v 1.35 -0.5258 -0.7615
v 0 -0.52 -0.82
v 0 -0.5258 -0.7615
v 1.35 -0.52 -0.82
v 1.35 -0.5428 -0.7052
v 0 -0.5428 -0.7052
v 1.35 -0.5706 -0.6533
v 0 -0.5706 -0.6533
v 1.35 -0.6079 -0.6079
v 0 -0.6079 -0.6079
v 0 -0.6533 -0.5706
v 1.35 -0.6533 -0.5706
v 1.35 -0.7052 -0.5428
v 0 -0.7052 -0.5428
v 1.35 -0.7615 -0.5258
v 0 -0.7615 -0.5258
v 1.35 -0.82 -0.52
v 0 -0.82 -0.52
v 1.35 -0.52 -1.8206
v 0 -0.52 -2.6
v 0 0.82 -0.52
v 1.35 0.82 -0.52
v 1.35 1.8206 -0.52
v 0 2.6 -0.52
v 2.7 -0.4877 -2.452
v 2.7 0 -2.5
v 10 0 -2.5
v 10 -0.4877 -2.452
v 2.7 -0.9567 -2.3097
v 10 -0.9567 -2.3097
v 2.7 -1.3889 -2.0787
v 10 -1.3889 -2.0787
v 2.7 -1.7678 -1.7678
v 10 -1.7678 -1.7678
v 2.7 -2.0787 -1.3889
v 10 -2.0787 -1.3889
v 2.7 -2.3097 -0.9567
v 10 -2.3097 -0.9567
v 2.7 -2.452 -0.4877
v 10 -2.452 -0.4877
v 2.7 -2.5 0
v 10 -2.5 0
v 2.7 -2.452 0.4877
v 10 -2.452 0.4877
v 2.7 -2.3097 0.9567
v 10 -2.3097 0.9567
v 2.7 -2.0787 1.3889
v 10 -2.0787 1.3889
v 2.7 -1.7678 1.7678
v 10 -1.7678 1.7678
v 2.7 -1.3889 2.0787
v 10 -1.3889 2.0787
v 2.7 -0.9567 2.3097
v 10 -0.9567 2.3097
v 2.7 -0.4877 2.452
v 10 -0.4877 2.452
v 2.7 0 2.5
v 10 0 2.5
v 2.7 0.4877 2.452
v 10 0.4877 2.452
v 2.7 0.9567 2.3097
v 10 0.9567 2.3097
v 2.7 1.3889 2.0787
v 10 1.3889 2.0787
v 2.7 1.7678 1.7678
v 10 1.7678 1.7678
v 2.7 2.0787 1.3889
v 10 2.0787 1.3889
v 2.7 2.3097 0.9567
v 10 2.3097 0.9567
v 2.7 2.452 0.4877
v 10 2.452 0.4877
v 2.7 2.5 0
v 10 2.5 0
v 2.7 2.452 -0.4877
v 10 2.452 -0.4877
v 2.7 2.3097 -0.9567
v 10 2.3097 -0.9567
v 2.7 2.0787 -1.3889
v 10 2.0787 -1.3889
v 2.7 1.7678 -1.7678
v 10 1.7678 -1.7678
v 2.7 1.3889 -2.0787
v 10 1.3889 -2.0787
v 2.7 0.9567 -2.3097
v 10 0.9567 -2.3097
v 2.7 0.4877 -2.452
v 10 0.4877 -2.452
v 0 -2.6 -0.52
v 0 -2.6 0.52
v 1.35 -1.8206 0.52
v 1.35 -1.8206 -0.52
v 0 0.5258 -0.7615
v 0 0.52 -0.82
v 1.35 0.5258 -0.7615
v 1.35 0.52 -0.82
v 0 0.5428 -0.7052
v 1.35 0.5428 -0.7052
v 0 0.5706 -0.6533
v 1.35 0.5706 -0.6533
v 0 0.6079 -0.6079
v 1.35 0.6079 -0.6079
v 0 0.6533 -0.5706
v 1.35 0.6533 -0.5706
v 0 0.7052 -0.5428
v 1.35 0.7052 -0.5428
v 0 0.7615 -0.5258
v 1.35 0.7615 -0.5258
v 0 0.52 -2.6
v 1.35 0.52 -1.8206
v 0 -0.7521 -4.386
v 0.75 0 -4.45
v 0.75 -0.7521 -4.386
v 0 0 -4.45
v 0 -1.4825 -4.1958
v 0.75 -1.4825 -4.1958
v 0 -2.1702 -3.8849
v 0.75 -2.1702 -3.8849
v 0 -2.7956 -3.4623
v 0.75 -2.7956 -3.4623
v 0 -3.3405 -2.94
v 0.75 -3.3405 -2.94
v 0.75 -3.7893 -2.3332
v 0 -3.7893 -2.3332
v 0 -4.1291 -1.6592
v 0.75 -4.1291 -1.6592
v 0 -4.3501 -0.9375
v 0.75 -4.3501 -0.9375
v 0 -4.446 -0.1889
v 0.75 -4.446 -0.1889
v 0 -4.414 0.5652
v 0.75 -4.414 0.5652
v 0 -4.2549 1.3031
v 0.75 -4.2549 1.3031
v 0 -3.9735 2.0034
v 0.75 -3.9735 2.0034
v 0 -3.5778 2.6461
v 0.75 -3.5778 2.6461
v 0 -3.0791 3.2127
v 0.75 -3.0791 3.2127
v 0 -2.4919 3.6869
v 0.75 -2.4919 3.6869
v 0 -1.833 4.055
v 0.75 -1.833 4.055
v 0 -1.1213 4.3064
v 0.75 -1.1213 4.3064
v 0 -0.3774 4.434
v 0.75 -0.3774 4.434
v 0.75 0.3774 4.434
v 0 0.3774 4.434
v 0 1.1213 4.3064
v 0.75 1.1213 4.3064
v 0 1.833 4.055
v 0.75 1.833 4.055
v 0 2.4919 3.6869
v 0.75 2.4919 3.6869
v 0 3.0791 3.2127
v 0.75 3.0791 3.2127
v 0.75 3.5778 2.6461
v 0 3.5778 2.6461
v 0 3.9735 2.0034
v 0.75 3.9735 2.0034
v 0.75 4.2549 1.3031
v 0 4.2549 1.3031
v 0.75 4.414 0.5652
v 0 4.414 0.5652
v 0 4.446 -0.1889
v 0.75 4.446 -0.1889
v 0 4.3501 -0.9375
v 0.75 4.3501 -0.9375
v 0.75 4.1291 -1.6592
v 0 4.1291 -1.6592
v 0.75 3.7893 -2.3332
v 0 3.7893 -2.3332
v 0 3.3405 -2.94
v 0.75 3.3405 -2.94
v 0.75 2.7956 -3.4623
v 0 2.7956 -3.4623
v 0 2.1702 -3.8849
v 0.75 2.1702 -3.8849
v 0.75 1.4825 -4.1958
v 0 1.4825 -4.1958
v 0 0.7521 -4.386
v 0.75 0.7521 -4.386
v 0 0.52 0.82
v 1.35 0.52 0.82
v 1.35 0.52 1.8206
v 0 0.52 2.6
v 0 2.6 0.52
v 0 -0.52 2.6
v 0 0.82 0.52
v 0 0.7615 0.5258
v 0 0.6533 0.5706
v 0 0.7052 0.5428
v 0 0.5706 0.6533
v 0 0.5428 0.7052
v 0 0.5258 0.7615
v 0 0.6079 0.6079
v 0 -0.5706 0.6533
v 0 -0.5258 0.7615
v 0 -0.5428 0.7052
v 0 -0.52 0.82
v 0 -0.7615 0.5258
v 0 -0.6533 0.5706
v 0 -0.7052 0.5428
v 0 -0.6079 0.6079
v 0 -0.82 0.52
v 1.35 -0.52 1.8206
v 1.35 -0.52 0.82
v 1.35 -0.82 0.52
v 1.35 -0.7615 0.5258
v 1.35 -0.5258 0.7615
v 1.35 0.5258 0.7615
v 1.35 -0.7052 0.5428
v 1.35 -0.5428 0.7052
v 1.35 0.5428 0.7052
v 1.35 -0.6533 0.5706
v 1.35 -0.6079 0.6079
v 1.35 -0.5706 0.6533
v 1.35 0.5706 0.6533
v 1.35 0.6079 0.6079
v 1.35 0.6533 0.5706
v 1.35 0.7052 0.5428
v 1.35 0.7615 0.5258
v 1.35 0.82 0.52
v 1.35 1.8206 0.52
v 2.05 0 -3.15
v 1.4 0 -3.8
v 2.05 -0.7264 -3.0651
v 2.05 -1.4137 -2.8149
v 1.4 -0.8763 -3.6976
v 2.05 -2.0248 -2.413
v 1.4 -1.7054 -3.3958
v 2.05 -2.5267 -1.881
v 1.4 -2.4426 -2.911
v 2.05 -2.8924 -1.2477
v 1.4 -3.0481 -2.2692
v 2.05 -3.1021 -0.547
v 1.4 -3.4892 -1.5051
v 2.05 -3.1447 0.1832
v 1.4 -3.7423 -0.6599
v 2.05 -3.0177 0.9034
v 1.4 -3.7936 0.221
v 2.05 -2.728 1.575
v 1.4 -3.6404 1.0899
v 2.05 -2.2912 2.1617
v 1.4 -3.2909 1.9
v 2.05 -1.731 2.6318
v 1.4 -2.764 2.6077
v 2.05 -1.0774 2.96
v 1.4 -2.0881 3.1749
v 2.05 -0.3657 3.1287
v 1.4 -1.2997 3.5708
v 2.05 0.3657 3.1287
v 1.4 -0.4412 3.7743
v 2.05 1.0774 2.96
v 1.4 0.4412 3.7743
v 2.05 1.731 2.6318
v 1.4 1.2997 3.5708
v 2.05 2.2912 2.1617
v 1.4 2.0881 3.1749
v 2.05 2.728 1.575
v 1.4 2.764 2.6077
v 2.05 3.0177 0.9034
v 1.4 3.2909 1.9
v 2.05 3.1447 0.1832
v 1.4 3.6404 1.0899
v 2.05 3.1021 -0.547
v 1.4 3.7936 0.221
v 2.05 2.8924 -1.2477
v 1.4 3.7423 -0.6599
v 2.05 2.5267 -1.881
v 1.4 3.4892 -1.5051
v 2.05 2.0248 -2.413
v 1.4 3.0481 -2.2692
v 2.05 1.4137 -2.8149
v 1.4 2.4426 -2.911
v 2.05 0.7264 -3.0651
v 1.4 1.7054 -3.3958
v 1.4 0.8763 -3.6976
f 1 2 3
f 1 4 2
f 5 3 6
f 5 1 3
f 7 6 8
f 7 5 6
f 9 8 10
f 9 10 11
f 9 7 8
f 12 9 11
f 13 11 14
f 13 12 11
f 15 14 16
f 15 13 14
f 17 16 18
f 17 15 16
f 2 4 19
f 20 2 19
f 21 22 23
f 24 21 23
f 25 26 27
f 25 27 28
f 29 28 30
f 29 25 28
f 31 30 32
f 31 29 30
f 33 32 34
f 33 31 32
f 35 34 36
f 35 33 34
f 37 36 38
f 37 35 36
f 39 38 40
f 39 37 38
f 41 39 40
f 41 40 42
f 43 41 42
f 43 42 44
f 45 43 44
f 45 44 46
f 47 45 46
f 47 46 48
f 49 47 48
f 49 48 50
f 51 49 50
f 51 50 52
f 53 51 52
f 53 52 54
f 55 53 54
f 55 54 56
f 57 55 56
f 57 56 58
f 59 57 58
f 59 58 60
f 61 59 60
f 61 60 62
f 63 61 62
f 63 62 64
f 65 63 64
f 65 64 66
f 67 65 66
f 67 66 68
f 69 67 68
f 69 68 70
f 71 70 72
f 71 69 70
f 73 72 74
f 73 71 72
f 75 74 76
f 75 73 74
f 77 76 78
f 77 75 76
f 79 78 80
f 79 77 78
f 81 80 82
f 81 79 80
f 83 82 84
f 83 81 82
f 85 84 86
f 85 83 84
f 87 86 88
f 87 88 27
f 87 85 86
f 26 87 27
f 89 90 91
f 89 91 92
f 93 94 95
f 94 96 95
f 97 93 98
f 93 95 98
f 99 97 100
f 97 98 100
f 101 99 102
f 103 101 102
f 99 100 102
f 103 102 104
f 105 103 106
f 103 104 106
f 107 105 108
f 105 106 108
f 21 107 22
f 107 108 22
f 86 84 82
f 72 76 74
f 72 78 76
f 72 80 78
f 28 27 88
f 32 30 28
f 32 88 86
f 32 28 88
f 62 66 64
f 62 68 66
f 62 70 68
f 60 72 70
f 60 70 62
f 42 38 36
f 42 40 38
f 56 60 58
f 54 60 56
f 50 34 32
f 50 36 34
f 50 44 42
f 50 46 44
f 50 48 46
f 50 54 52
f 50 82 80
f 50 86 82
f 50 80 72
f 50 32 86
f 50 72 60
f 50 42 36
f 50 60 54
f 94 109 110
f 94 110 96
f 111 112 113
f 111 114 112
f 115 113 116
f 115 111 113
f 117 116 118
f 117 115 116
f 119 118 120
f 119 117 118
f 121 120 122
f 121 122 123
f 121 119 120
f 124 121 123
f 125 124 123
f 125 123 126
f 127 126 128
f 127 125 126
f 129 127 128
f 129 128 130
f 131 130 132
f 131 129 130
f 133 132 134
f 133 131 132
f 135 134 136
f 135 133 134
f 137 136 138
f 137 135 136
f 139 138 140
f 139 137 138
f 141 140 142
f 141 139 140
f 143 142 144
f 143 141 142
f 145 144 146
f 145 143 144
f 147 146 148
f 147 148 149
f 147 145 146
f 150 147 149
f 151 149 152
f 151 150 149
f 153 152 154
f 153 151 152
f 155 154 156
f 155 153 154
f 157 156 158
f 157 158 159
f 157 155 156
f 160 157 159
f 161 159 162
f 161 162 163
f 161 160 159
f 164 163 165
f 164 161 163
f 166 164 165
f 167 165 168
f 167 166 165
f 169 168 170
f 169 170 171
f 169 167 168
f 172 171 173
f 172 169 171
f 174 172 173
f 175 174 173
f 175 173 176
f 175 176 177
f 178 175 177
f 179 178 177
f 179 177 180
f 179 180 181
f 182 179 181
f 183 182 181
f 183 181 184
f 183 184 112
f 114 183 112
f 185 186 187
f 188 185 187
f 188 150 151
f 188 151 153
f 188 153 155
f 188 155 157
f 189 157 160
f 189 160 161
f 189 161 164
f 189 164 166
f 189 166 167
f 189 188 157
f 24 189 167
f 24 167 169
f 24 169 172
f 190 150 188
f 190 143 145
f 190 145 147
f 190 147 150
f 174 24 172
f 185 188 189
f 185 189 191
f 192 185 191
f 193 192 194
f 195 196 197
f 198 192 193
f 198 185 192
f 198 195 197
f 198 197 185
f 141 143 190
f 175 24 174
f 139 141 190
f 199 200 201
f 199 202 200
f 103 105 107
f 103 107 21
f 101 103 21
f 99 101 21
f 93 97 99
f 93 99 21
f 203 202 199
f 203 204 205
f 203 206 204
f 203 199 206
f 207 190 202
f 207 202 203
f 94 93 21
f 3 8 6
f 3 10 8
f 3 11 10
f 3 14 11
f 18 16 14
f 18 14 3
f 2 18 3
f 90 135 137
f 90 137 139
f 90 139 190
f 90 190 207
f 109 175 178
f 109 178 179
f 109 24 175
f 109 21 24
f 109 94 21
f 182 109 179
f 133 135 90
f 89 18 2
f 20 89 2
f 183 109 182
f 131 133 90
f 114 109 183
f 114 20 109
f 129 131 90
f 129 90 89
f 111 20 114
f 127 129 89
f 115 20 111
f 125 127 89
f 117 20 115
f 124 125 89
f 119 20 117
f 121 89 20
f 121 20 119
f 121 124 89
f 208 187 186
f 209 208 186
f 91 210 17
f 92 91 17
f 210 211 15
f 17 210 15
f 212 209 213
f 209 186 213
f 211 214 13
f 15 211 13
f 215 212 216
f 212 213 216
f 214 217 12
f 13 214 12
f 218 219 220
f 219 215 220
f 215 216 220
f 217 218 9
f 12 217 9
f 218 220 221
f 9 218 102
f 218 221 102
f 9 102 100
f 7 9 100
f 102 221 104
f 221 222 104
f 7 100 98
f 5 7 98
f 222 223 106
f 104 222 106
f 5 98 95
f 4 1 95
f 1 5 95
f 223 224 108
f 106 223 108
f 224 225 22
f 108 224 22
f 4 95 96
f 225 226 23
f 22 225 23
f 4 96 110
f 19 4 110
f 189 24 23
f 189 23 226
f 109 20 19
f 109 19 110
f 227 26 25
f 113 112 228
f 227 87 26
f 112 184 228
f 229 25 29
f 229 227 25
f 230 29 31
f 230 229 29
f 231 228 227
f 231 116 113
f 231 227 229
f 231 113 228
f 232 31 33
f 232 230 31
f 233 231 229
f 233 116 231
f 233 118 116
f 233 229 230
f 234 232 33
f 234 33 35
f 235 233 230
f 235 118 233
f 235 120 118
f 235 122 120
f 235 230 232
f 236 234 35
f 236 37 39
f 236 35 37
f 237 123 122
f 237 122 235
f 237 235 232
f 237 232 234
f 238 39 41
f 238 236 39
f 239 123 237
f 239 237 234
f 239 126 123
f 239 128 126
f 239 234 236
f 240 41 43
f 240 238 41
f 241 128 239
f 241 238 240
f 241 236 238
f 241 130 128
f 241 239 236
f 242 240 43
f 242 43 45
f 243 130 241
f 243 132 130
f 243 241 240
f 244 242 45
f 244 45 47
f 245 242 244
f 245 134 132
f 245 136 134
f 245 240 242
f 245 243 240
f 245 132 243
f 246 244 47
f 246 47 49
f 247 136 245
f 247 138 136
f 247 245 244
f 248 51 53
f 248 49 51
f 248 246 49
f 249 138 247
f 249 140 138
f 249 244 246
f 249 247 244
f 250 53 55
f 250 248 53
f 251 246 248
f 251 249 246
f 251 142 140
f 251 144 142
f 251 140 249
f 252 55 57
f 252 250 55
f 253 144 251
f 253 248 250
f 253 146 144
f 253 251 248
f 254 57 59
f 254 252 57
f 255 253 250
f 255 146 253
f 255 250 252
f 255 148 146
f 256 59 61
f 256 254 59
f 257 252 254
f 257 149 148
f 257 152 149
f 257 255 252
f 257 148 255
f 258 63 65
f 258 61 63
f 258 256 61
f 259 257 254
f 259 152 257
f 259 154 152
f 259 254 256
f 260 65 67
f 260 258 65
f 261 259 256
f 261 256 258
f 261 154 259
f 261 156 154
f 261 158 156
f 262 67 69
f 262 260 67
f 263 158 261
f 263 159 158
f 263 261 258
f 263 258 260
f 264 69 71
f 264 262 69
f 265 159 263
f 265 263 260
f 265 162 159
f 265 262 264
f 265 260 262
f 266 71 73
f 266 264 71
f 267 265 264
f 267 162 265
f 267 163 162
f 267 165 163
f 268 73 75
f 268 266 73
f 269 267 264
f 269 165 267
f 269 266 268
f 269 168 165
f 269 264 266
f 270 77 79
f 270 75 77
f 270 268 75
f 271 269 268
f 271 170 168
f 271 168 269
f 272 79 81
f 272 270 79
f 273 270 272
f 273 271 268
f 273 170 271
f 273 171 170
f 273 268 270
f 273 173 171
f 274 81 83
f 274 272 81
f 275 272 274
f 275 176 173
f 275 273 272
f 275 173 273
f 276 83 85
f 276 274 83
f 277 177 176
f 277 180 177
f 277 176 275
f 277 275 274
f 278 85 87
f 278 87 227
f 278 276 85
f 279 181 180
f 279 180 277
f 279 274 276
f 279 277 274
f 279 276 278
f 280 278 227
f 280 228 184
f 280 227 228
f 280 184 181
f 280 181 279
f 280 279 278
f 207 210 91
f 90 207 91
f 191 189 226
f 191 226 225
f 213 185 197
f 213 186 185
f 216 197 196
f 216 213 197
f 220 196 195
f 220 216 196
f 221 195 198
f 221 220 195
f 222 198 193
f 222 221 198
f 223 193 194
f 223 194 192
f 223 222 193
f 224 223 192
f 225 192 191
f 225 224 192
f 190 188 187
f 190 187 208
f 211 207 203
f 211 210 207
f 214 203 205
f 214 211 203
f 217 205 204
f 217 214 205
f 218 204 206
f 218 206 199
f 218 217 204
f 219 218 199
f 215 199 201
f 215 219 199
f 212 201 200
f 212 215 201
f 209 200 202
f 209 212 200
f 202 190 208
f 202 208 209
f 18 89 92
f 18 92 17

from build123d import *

# Parameters (mm, degrees)
CROSSRECESS_DEPTH = 1.35
DRAFT9_ANGLE      = 30
FILLET5_R         = 0.3
SKETCH10_W        = 0.8
SKETCH10_H        = 2.5


with BuildPart() as part:
    # Sketch1 → Base (revolve)
    with BuildSketch(Plane.XY, mode=Mode.PRIVATE) as base_sk:
        Polygon((10, 2.5), (4.3, 2.5), (2.7, 2.5), (0.75, 4.45), (0, 4.45), (0, 0), (10, 0), align=None)
    revolve(base_sk.sketch.rotate(Axis((4.515812911, 0, 0), (-1, 0, 0)), 90), axis=Axis((4.515812911, 0, 0), (-1, 0, 0)))

    # Sketch6 → CrossRecess (cut)
    with BuildSketch(Plane(origin=(0, 0, 0), x_dir=(0, 0, -1), z_dir=(1, 0, 0))):
        Polygon((0.52, 0.52), (0.52, 2.6), (-0.52, 2.6), (-0.52, 0.52), (-2.6, 0.52), (-2.6, -0.52), (-0.52, -0.52), (-0.52, -2.6), (0.52, -2.6), (0.52, -0.52), (2.6, -0.52), (2.6, 0.52), align=None)
    extrude(amount=CROSSRECESS_DEPTH, mode=Mode.SUBTRACT)

    # Draft9
    draft9_faces = [part.faces().sort_by_distance(p)[0] for p in [
        (0.675, -2.6, 0),
        (0.675, 0, 2.6),
        (0.675, 0, -2.6),
        (0.675, 2.6, 0),
    ]]
    draft(draft9_faces, Plane(origin=(0, 4.45, 0), x_dir=(0, 0, -1), z_dir=(-1, 0, 0)), DRAFT9_ANGLE)

    # Fillet5
    fillet5_edges = [part.edges().sort_by_distance(p)[0] for p in [
        (0.675, 0.52, 0.52),
        (0.675, -0.52, 0.52),
        (0.675, -0.52, -0.52),
        (0.675, 0.52, -0.52),
    ]]
    fillet(fillet5_edges, radius=FILLET5_R)

    # Sketch10 → Revolve2 (revolve)
    with BuildSketch(Plane.XY):
        with Locations((3.1, 1.25)):
            Rectangle(SKETCH10_W, SKETCH10_H)
    revolve(axis=Axis((62.228915663, 0, 0), (-1, 0, 0)))


solid = part.part
